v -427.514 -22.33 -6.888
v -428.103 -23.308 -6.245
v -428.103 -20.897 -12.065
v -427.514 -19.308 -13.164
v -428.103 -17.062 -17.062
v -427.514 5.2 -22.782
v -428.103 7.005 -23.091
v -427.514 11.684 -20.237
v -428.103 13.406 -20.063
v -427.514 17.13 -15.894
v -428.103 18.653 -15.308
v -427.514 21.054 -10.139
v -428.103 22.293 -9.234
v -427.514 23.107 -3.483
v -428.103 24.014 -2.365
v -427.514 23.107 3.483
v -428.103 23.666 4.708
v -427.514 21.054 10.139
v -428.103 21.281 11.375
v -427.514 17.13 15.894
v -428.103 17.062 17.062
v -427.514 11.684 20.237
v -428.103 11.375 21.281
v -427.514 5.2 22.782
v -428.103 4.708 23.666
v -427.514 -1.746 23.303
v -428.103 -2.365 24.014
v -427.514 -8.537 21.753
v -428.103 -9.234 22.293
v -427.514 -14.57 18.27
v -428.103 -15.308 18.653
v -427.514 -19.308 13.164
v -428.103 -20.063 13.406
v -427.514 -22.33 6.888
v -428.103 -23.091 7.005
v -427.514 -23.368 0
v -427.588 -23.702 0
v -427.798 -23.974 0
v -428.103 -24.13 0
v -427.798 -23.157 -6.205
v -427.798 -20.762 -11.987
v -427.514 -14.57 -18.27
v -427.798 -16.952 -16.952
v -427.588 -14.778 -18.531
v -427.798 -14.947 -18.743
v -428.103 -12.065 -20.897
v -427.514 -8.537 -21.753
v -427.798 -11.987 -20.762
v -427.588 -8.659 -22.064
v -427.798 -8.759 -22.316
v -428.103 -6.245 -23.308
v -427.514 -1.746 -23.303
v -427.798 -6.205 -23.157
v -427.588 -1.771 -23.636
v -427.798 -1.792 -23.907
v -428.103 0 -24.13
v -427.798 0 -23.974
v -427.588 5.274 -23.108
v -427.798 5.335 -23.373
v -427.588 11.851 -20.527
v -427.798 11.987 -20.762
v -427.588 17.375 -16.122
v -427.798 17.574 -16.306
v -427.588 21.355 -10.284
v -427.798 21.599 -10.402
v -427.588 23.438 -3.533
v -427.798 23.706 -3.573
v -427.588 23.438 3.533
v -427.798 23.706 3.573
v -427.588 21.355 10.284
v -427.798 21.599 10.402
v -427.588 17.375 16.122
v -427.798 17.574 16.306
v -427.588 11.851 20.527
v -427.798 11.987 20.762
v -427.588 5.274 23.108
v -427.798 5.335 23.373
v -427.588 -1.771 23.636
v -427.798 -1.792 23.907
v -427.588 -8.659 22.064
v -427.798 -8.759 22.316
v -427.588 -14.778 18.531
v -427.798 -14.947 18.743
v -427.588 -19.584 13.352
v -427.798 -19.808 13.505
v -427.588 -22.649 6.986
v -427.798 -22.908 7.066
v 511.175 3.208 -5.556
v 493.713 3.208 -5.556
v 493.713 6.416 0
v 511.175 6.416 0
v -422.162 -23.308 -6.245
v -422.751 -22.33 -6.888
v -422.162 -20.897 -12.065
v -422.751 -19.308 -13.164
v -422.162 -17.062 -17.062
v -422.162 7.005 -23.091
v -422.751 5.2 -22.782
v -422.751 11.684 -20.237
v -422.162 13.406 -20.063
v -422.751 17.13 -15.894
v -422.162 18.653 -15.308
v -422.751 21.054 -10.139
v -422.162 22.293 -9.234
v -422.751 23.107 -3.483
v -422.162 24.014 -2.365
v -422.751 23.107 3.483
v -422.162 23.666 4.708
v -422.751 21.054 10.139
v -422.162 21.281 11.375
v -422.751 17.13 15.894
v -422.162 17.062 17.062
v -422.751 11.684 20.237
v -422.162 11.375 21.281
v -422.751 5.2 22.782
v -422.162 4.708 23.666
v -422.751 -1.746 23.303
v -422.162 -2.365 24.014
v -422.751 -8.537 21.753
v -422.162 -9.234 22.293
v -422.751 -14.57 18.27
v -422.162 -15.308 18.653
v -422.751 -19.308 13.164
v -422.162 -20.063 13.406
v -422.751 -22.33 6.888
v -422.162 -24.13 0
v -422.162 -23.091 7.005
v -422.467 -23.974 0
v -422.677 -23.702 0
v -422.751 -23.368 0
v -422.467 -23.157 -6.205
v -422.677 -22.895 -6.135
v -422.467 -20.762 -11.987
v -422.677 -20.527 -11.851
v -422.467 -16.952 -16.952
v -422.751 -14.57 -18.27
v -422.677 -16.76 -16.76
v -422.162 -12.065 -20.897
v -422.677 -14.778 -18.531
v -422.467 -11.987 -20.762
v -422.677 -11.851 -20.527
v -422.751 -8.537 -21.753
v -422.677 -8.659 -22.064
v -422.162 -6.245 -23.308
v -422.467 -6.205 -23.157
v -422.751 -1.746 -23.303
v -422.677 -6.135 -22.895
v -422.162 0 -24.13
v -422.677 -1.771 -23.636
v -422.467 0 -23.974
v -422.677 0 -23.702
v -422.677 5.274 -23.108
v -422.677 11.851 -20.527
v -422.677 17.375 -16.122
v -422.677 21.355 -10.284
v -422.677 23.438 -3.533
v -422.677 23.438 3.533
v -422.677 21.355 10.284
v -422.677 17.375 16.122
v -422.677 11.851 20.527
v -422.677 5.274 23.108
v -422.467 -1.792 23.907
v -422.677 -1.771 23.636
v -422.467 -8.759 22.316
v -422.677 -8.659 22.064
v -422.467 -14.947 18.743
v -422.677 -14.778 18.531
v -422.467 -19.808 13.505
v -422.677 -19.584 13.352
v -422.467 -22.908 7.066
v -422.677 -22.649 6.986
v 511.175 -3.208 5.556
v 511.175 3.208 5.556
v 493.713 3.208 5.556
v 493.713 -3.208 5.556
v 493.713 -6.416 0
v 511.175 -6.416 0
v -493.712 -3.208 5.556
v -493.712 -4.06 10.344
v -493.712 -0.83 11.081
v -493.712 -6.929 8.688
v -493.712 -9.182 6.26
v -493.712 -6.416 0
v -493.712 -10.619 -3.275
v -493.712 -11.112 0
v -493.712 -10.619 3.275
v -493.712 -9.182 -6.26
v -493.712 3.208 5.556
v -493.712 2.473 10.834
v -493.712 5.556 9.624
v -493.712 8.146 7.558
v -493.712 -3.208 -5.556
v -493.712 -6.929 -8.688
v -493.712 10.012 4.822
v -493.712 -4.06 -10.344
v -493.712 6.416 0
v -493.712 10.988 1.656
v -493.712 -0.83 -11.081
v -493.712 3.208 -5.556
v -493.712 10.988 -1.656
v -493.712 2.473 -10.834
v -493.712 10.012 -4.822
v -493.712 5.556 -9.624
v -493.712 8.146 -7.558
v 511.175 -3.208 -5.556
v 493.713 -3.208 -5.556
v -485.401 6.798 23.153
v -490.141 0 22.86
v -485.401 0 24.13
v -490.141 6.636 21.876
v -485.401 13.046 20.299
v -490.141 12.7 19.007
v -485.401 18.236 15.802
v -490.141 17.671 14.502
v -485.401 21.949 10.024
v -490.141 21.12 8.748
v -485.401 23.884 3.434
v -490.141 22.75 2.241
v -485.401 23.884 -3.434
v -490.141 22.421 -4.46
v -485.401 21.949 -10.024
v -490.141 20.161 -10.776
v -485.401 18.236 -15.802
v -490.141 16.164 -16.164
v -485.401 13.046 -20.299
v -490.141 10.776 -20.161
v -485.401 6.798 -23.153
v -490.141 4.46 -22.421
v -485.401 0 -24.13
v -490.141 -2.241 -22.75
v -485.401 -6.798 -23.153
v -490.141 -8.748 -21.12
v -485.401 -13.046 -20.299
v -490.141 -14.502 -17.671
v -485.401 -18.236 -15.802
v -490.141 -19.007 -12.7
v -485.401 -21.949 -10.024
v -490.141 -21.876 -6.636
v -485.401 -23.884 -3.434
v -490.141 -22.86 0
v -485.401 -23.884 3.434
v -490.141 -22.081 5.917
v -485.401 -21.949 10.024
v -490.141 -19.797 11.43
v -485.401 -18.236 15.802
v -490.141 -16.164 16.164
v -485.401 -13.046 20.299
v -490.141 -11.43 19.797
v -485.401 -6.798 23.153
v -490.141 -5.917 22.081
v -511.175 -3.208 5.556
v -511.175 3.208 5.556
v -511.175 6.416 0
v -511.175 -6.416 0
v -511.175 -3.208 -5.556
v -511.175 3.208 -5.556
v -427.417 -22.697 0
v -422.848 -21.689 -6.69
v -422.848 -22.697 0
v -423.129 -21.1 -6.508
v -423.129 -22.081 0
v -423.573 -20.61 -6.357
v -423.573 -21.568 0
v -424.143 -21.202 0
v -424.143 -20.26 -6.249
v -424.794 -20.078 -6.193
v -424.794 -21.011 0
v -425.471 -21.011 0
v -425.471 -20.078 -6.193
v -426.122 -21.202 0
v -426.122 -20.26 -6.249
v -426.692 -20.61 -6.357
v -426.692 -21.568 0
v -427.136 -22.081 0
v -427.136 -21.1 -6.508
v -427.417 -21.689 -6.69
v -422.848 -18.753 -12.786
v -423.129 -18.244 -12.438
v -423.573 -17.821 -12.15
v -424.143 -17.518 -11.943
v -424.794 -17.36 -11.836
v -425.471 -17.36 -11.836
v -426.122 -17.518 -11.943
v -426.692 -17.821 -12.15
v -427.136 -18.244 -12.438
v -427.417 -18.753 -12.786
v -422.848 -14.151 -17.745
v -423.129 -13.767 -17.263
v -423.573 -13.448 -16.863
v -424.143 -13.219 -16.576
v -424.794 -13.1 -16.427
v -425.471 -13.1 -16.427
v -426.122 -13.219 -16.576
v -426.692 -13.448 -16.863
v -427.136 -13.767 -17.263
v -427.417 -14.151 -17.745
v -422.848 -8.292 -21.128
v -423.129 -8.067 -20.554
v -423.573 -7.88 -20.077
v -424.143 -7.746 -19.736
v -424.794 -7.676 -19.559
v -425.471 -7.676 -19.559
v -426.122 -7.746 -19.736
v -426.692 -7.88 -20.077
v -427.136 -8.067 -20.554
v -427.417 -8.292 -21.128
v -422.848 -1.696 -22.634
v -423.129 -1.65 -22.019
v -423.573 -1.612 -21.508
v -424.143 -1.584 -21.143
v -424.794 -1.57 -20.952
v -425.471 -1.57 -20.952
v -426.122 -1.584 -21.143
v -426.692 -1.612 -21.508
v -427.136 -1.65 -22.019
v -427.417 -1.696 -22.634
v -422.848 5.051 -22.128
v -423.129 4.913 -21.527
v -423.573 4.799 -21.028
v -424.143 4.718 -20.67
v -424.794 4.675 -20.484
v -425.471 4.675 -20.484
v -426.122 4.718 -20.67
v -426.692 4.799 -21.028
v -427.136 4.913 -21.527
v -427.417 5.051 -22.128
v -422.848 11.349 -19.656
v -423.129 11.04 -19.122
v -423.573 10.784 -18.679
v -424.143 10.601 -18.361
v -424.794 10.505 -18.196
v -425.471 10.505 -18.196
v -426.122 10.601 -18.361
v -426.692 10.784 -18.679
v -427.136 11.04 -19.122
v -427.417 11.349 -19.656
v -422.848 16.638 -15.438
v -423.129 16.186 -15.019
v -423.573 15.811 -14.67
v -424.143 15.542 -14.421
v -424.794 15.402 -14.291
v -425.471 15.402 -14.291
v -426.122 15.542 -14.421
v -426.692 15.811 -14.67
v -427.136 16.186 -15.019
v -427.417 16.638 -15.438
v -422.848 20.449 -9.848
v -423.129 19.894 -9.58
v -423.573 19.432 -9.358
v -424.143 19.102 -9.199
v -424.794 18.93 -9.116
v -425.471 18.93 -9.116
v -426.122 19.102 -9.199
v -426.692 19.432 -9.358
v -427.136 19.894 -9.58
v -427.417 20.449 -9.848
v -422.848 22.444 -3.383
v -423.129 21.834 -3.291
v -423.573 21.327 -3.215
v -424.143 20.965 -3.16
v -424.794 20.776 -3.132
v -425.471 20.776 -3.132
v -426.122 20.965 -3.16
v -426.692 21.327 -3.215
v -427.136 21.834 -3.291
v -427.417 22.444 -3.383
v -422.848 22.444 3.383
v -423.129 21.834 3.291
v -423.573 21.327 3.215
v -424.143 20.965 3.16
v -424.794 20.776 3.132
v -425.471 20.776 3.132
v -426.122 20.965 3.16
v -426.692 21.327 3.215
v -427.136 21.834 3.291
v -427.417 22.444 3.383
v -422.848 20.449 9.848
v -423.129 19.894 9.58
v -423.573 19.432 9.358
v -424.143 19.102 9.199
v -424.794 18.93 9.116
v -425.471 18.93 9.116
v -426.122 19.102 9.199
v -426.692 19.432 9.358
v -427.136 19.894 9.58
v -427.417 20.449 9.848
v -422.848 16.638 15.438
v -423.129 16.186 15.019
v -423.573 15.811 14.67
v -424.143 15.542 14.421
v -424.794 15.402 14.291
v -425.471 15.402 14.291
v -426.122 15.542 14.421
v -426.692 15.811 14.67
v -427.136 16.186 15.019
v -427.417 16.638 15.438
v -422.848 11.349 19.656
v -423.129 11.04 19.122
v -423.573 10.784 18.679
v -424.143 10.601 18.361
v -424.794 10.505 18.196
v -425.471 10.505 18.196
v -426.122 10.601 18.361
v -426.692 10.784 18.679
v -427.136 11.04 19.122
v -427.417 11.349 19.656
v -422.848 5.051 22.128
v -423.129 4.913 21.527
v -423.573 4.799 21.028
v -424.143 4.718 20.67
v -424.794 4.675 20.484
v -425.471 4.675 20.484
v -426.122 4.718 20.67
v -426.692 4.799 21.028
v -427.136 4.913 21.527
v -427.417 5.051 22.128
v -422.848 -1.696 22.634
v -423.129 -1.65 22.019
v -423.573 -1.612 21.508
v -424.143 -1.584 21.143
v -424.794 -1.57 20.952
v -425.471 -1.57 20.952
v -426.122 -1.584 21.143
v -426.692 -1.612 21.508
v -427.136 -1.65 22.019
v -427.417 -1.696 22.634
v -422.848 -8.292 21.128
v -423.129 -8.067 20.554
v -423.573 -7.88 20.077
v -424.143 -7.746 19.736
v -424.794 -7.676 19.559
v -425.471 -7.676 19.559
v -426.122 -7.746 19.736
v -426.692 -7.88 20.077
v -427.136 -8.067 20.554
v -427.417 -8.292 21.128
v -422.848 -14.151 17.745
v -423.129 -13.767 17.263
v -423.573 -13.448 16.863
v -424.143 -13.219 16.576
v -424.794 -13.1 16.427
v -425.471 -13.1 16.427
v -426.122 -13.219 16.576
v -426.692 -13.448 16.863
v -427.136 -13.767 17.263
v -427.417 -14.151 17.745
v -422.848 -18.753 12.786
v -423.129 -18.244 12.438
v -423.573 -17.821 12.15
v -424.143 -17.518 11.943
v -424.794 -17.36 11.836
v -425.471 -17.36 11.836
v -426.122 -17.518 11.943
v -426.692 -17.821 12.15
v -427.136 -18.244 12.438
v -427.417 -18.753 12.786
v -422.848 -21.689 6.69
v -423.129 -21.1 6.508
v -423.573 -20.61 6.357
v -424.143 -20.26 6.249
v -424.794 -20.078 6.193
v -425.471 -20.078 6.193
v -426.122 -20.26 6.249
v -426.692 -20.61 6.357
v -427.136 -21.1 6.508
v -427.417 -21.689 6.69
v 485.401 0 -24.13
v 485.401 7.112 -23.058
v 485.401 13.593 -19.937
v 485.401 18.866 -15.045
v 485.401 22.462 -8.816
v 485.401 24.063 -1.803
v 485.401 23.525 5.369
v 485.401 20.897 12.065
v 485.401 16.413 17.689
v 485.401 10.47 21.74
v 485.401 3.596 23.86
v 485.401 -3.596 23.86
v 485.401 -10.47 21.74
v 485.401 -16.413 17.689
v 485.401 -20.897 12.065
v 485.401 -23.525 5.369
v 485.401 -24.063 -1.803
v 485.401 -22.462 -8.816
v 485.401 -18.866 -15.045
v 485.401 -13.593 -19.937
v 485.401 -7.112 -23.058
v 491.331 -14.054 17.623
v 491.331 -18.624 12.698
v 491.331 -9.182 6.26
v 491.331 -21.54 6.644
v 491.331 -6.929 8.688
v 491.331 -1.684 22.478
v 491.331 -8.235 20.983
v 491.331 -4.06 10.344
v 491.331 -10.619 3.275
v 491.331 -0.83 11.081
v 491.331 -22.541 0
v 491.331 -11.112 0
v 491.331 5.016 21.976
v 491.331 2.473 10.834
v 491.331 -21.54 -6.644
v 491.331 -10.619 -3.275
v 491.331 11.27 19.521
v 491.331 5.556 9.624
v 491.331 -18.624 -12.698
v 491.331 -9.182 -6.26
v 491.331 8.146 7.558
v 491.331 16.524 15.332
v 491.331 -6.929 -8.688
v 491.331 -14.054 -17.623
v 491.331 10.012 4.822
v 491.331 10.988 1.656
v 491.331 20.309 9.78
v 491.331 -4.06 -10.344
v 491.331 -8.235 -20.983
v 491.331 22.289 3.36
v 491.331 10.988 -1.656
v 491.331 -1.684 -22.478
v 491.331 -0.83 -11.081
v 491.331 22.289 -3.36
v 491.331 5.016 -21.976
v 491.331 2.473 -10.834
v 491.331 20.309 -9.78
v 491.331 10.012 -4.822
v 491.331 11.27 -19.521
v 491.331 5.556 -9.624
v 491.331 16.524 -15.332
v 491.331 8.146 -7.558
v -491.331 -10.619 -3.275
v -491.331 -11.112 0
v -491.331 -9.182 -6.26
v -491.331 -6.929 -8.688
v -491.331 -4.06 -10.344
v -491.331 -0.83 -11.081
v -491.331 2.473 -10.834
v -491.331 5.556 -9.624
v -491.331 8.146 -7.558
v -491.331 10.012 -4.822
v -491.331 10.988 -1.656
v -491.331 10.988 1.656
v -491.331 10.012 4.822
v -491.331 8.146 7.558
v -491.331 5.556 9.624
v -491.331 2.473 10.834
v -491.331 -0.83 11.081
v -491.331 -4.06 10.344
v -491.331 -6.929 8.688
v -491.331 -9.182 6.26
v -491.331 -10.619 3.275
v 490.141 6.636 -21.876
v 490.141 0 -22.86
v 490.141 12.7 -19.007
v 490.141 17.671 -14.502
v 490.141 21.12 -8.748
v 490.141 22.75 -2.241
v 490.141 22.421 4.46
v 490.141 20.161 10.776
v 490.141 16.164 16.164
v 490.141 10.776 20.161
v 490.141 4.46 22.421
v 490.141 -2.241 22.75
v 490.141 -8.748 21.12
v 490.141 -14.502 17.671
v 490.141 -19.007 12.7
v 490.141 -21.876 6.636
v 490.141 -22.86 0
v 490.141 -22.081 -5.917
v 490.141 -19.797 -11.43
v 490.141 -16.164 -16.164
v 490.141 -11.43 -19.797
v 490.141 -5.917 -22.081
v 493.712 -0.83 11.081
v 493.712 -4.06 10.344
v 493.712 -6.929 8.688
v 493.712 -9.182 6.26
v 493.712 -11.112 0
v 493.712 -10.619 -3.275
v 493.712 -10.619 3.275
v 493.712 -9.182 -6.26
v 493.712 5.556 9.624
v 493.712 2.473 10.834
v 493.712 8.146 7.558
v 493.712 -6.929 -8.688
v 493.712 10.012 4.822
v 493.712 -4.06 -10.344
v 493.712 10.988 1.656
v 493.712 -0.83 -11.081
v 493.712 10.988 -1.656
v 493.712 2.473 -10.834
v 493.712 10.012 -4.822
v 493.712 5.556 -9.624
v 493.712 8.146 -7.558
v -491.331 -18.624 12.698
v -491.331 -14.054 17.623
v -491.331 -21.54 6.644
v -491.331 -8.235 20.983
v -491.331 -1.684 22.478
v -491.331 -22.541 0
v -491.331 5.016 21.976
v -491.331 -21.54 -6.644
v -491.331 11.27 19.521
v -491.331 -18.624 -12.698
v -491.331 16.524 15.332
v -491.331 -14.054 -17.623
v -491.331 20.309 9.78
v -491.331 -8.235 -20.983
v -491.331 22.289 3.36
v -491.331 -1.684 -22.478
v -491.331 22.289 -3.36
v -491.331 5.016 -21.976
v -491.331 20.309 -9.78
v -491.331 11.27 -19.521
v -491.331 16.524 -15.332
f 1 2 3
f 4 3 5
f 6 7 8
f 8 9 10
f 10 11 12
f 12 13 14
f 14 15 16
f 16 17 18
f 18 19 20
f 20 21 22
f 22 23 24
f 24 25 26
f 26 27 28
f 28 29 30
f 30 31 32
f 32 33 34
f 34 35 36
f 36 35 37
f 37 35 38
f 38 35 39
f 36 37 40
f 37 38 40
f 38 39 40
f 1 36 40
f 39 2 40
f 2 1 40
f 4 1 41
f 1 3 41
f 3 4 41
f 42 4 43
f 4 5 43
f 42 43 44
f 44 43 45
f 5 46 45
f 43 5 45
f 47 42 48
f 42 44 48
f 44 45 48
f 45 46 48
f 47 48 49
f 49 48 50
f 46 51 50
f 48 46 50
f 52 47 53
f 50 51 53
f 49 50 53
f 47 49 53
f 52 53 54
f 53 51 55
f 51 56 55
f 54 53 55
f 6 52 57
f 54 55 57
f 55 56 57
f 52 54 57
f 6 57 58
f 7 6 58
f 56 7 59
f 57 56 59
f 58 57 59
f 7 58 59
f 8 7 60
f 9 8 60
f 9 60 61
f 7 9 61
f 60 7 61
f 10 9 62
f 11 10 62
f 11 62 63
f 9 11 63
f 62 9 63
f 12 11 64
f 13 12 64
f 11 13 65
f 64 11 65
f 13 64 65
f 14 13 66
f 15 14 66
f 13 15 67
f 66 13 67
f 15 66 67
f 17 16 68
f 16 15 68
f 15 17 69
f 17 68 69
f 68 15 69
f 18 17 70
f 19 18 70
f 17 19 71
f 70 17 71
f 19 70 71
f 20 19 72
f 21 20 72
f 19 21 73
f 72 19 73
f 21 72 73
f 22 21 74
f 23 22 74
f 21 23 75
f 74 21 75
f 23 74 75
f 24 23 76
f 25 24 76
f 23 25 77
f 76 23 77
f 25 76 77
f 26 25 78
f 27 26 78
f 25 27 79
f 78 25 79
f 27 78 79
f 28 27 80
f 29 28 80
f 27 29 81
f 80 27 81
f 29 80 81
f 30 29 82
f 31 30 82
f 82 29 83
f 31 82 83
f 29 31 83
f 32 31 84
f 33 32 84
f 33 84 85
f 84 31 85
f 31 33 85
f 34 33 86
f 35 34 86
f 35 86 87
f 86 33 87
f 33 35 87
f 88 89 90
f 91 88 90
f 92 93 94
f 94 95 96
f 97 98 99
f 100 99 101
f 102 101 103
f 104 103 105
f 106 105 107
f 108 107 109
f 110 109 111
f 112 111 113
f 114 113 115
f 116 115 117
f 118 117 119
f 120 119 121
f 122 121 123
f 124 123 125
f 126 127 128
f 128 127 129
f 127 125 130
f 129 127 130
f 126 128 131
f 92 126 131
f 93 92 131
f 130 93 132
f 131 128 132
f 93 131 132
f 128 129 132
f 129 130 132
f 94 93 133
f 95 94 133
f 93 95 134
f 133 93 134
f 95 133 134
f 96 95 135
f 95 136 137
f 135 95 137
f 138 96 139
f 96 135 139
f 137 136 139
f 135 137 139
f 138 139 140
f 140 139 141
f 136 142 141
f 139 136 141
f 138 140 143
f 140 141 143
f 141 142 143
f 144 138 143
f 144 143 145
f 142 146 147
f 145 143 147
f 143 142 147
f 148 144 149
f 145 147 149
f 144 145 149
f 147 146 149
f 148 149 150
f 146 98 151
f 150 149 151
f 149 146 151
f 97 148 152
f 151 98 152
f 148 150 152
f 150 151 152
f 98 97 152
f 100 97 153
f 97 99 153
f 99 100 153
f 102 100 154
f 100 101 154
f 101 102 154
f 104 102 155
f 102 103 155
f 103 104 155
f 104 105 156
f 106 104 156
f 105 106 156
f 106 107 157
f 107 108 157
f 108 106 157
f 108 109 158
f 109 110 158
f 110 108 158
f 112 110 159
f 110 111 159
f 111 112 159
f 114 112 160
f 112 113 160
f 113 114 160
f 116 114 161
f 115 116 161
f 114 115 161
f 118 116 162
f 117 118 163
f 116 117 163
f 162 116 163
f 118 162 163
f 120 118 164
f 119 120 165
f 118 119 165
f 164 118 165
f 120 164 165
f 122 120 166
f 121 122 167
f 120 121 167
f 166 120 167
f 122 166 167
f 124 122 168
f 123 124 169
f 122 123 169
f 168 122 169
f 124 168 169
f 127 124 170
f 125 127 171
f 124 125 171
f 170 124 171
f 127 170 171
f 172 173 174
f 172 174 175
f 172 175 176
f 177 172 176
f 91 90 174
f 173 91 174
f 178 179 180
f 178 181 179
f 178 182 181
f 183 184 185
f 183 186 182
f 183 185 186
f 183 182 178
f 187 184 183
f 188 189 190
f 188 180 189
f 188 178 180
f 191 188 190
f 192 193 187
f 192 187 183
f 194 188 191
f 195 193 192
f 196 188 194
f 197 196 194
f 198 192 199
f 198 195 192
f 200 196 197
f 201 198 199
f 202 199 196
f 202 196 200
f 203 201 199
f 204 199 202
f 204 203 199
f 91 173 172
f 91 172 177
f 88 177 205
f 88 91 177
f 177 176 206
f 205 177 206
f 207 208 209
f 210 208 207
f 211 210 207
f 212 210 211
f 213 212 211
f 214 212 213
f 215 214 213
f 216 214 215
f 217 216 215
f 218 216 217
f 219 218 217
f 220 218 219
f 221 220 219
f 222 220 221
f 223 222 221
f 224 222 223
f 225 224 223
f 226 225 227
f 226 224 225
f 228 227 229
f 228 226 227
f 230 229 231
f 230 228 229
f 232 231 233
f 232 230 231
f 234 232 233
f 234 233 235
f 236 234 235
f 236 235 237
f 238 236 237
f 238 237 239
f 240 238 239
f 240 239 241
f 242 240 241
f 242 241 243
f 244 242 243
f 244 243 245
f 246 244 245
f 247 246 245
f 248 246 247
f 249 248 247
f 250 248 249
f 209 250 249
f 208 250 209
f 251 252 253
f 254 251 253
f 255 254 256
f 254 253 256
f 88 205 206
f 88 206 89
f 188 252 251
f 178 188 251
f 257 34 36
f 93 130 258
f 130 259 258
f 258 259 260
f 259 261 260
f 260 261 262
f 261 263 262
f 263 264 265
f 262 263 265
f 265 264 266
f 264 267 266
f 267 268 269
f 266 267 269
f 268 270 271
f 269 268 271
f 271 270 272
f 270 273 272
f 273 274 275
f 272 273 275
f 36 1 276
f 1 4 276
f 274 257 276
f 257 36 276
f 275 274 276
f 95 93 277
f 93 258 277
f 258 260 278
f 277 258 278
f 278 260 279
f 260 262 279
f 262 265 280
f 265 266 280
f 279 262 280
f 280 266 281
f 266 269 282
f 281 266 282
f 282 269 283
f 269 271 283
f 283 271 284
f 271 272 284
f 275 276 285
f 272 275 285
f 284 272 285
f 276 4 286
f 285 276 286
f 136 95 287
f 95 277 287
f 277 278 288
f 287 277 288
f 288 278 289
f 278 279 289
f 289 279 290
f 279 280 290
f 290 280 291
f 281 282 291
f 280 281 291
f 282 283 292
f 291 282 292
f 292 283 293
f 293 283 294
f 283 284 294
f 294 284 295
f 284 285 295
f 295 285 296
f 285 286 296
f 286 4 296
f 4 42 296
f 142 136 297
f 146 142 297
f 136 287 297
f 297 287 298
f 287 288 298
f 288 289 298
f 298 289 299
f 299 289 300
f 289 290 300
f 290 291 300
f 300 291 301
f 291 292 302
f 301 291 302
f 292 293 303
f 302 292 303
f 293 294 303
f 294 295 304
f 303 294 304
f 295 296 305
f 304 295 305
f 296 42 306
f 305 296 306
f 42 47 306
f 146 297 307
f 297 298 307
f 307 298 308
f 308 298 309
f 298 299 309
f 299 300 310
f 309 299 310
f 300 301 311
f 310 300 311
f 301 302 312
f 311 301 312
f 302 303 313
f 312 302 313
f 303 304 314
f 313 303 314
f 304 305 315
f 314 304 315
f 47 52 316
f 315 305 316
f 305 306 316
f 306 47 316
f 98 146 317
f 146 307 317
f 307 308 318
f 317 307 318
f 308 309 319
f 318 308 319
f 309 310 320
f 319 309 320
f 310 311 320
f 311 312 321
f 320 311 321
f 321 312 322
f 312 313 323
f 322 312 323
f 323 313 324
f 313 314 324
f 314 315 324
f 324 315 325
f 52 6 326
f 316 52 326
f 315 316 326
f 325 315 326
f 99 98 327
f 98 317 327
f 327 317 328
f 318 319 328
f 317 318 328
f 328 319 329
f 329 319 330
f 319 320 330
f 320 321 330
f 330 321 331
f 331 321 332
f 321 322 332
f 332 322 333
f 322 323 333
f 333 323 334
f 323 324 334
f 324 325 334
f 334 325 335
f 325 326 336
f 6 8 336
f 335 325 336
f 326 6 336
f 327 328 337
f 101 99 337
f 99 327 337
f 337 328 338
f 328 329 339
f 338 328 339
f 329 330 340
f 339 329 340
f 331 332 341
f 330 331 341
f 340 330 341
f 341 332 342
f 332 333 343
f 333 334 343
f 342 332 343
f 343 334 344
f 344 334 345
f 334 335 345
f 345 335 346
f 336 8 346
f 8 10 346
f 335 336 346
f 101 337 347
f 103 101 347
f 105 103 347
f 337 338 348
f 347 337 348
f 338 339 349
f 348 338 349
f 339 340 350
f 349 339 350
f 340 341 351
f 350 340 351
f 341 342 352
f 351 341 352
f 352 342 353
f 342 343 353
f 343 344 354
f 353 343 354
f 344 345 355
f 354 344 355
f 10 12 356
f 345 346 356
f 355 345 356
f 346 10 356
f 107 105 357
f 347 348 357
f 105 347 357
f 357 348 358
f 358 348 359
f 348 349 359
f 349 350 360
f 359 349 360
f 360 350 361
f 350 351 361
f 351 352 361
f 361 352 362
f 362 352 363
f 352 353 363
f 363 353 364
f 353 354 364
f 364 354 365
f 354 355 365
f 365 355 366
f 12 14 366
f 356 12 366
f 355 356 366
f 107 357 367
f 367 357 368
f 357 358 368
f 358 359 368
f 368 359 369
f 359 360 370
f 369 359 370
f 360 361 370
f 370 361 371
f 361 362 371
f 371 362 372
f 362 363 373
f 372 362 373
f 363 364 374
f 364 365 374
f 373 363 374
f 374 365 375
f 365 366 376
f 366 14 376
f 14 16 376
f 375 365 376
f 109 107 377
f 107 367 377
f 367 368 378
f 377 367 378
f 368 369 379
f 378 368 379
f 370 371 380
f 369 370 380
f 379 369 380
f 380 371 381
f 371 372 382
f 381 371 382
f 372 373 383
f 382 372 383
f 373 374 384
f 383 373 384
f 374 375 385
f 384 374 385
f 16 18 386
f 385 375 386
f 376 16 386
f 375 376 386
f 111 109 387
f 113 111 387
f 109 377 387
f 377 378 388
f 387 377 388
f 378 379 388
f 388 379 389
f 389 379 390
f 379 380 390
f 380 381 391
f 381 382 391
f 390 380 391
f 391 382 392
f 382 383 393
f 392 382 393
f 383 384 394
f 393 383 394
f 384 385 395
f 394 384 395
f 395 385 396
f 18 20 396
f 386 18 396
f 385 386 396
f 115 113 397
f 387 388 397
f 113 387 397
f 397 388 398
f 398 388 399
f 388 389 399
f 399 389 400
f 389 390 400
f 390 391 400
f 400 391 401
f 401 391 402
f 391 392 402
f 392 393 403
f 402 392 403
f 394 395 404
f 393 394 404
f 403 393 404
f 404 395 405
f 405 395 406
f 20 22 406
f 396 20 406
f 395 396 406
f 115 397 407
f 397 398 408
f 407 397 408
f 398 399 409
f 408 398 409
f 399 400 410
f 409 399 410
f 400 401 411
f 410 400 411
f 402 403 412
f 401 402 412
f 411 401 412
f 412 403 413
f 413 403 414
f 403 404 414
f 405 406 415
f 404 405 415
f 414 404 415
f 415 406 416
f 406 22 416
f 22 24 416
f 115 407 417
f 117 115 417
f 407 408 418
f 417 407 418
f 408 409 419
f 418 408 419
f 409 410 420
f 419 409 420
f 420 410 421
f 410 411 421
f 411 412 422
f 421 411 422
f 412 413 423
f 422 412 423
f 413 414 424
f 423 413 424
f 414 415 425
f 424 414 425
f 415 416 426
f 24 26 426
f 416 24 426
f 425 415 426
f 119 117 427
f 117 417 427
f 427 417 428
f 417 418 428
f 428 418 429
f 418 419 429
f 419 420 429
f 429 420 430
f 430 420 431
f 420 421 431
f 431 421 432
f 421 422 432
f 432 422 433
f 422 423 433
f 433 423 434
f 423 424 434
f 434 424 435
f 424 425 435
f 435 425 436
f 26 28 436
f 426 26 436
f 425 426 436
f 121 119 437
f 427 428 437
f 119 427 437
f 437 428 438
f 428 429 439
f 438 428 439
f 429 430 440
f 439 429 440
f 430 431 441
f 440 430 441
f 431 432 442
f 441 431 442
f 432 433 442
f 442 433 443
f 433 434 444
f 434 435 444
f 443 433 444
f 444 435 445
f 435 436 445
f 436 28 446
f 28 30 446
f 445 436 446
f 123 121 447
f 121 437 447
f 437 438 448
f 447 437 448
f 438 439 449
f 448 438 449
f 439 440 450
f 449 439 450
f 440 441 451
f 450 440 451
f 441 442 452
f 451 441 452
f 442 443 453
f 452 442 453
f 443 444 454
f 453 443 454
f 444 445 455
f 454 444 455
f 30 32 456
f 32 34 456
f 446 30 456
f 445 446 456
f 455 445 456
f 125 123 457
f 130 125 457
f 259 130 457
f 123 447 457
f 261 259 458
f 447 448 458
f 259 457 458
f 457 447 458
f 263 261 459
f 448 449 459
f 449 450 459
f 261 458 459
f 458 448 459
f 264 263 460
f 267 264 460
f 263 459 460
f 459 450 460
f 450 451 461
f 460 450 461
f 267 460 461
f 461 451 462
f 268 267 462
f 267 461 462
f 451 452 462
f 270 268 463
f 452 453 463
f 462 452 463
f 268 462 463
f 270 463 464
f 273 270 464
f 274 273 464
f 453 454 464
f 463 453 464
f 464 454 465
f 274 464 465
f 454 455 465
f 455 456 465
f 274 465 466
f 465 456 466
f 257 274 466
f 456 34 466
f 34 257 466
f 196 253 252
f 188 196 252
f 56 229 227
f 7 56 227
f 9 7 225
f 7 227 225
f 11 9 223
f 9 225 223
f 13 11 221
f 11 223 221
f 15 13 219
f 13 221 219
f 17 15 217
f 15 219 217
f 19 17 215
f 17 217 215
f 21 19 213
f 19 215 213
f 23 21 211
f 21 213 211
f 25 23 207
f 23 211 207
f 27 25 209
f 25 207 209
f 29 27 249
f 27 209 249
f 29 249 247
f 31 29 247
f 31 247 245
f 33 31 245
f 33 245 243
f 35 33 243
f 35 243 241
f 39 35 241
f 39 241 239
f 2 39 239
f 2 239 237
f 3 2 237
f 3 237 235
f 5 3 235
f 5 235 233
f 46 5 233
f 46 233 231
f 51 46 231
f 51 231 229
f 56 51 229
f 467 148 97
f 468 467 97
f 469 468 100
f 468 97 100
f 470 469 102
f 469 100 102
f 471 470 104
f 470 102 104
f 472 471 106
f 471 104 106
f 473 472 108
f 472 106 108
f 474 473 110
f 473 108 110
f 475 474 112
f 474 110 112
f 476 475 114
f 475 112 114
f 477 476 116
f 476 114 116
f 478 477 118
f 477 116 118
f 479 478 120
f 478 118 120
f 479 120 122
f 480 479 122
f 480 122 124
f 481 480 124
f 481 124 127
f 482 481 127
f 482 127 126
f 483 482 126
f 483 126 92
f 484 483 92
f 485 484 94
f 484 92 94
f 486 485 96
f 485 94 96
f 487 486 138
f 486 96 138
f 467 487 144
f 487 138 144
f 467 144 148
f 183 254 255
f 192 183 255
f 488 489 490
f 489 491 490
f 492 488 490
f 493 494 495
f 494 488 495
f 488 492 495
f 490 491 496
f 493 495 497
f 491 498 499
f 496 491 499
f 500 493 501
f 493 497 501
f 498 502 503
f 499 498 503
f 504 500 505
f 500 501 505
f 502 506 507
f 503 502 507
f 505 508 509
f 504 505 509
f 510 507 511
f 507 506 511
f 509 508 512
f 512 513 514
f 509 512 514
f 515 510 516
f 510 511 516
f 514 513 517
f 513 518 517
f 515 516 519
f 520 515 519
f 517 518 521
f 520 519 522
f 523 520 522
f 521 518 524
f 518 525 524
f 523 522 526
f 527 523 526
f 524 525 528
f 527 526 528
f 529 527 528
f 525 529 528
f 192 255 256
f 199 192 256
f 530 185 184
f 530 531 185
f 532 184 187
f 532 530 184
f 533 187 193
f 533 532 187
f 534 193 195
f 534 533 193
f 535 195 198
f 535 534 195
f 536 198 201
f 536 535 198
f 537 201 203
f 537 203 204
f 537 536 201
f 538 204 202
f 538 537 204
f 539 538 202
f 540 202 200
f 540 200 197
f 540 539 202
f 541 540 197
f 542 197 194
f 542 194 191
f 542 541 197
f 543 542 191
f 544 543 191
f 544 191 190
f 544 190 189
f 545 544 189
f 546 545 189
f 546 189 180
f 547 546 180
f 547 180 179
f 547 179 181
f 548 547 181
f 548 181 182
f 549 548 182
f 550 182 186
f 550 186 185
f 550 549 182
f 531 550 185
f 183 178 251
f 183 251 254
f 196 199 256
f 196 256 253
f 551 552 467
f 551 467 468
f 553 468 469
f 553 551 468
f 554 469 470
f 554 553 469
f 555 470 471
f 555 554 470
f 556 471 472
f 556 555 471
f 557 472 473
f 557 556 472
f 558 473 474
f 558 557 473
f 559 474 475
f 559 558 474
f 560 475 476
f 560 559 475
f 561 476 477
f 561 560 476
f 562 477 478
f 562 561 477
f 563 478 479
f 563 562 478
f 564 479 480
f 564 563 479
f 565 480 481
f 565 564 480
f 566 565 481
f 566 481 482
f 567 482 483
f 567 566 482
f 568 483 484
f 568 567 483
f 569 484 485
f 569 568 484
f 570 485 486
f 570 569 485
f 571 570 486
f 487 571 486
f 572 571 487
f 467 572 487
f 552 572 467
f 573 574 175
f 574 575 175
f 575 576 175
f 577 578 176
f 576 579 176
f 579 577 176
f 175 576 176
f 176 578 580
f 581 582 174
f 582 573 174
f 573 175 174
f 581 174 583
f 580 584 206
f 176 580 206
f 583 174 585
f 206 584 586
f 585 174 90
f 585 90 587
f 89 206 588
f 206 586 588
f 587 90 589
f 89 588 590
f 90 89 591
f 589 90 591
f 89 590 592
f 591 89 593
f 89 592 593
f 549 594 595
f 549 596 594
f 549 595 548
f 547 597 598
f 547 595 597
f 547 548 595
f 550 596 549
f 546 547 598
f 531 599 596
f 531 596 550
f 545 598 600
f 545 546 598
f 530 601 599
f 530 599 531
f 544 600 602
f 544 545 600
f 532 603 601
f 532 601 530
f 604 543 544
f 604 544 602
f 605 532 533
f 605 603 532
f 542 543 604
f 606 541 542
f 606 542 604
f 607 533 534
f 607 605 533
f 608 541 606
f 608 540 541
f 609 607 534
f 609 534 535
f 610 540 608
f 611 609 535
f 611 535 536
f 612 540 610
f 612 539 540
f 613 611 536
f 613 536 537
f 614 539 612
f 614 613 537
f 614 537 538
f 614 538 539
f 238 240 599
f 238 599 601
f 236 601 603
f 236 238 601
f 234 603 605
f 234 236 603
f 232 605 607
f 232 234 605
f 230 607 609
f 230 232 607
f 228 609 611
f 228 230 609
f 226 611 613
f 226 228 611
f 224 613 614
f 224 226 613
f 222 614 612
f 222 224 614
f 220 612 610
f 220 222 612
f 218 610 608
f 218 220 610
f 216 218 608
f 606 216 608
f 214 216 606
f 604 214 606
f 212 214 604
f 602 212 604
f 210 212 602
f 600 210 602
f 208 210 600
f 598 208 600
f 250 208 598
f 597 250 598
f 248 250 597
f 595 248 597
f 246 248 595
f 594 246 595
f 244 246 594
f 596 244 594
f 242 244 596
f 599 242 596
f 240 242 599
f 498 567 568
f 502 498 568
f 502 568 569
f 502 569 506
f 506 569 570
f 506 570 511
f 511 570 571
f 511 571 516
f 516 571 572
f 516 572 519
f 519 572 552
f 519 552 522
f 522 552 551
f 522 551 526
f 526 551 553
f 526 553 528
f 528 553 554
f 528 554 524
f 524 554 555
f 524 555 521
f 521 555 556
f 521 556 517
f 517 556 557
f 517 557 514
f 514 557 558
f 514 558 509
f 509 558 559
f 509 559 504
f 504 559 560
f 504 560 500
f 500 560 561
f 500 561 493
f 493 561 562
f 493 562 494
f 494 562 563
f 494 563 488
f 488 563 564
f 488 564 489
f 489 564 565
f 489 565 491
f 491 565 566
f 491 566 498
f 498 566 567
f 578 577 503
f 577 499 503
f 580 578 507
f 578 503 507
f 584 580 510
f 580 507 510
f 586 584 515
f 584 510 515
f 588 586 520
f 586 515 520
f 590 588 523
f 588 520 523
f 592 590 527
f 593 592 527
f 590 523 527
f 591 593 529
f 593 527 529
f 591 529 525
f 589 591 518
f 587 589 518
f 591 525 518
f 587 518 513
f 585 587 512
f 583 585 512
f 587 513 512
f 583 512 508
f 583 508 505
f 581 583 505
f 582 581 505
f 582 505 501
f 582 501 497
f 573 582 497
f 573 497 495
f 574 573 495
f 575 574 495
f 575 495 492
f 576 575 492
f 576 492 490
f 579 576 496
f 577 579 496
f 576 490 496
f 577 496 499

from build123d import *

# Parameters (mm, degrees)
BOSS_EXTRUDE1_DEPTH      = 490.140625
BOSS_EXTRUDE1_DEPTH_BACK = 490.140625
SKETCH3_R                = 24.13
SKETCH6_OUTSIDE_W        = 776.952
SKETCH6_OUTSIDE_H        = 776.952
SKETCH6_OUTSIDE_R        = 22.540972993
CUT_EXTRUDE2_DEPTH       = 986.634670258
CUT_EXTRUDE2_DRAFT       = -15
SKETCH7_OUTSIDE_W        = 776.952
SKETCH7_OUTSIDE_H        = 776.952
SKETCH7_OUTSIDE_R        = 22.540972993
CUT_EXTRUDE3_DEPTH       = 986.634670258
CUT_EXTRUDE3_DRAFT       = -15
BOSS_EXTRUDE2_DEPTH      = 511.175
BOSS_EXTRUDE2_DEPTH_BACK = 511.175


with BuildPart() as part:
    # Sketch2 → Revolve1 (revolve)
    with BuildSketch(Plane.XY, mode=Mode.PRIVATE) as revolve1_sk:
        Polygon((-493.7125, 0), (-493.7125, 11.1125), (-491.33125, 11.1125), (-491.33125, 22.540972993), (-490.140625, 22.86), (-490.140625, 0), align=None)
    revolve(revolve1_sk.sketch.rotate(Axis((-493.7125, 0, 0), (1, 0, 0)), 180), axis=Axis((-493.7125, 0, 0), (1, 0, 0)))


with BuildPart() as body_2:
    # Mirror2: mirrored copy
    add(part.part.mirror(Plane(origin=(0, 0, 0), x_dir=(0, 0, 1), z_dir=(1, 0, 0))))


with BuildPart() as body_3:
    # Sketch3 → Boss-Extrude1 (new, two sides: drawn at the far end of the back side and taken through both)
    with BuildSketch(Plane(origin=(0, 0, 0), x_dir=(0, 0, -1), z_dir=(1, 0, 0)).offset(-BOSS_EXTRUDE1_DEPTH_BACK)):
        Circle(SKETCH3_R)
    extrude(amount=BOSS_EXTRUDE1_DEPTH + BOSS_EXTRUDE1_DEPTH_BACK)


with BuildPart() as cut_extrude2_tool:
    # Sketch6 outside → Cut-Extrude2 (with draft: the straight prism first)
    with BuildSketch(Plane.ZY.offset(491.33125)):
        Rectangle(SKETCH6_OUTSIDE_W, SKETCH6_OUTSIDE_H)
        Circle(SKETCH6_OUTSIDE_R, mode=Mode.SUBTRACT)
    extrude(amount=-CUT_EXTRUDE2_DEPTH)
    # Cut-Extrude2: the draft: its side faces are tilted about the plane it starts from
    cut_extrude2_sides = [cut_extrude2_tool.faces().sort_by_distance(p)[0] for p in [
        (1.986085129, -388.476, 0),
        (1.986085129, 0, 388.476),
        (1.986085129, 388.476, 0),
        (1.986085129, 0, -388.476),
        (1.986085129, 0, -22.540972993),
    ]]
    draft(cut_extrude2_sides, Plane.ZY.offset(491.33125), CUT_EXTRUDE2_DRAFT)


with BuildPart() as body_3_1:
    add(body_3.part)

    # Cut-Extrude2: cut by cut_extrude2_tool
    add(cut_extrude2_tool.part, mode=Mode.SUBTRACT)


with BuildPart() as cut_extrude3_tool:
    # Sketch7 outside → Cut-Extrude3 (with draft: the straight prism first)
    with BuildSketch(Plane(origin=(491.33125, 0, 0), x_dir=(0, 0, -1), z_dir=(1, 0, 0))):
        Rectangle(SKETCH7_OUTSIDE_W, SKETCH7_OUTSIDE_H)
        Circle(SKETCH7_OUTSIDE_R, mode=Mode.SUBTRACT)
    extrude(amount=-CUT_EXTRUDE3_DEPTH)
    # Cut-Extrude3: the draft: its side faces are tilted about the plane it starts from
    cut_extrude3_sides = [cut_extrude3_tool.faces().sort_by_distance(p)[0] for p in [
        (-1.986085129, -388.476, 0),
        (-1.986085129, 0, -388.476),
        (-1.986085129, 388.476, 0),
        (-1.986085129, 0, 388.476),
        (-1.986085129, 0, 22.540972993),
    ]]
    draft(cut_extrude3_sides, Plane(origin=(491.33125, 0, 0), x_dir=(0, 0, -1), z_dir=(1, 0, 0)), CUT_EXTRUDE3_DRAFT)


with BuildPart() as body_3_2:
    add(body_3_1.part)

    # Cut-Extrude3: cut by cut_extrude3_tool
    add(cut_extrude3_tool.part, mode=Mode.SUBTRACT)


with BuildPart() as part_1:
    add(part.part)

    add(body_2.part)  # Boss-Extrude2 merges body 2

    add(body_3_2.part)  # Boss-Extrude2 merges body 3
    # Sketch4 → Boss-Extrude2 (add, two sides: drawn at the far end of the back side and taken through both)
    with BuildSketch(Plane(origin=(0, 0, 0), x_dir=(0, 0, -1), z_dir=(1, 0, 0)).offset(-BOSS_EXTRUDE2_DEPTH_BACK)):
        Polygon((0, 6.415804866), (-5.55625, 3.207902433), (-5.55625, -3.207902433), (0, -6.415804866), (5.55625, -3.207902433), (5.55625, 3.207902433), align=None)
    extrude(amount=BOSS_EXTRUDE2_DEPTH + BOSS_EXTRUDE2_DEPTH_BACK)

    # Sketch5 → Cut-Revolve1 (revolve, cut)
    with BuildSketch(Plane.XY, mode=Mode.PRIVATE) as cut_revolve1_sk:
        with BuildLine():
            Line((-428.30115, 24.1554), (-428.30115, 24.7904))
            Line((-428.30115, 24.7904), (-421.96385, 24.7904))
            Line((-421.96385, 24.7904), (-421.96385, 24.1554))
            ThreePointArc((-421.96385, 24.1554), (-422.52062588, 23.92477588), (-422.75125, 23.368))
            ThreePointArc((-422.75125, 23.368), (-425.1325, 20.98675), (-427.51375, 23.368))
            ThreePointArc((-427.51375, 23.368), (-427.74437412, 23.92477588), (-428.30115, 24.1554))
        make_face()
    revolve(cut_revolve1_sk.sketch.rotate(Axis((-511.175, 0, 0), (1, 0, 0)), 180), axis=Axis((-511.175, 0, 0), (1, 0, 0)), mode=Mode.SUBTRACT)


solid = part_1.part
